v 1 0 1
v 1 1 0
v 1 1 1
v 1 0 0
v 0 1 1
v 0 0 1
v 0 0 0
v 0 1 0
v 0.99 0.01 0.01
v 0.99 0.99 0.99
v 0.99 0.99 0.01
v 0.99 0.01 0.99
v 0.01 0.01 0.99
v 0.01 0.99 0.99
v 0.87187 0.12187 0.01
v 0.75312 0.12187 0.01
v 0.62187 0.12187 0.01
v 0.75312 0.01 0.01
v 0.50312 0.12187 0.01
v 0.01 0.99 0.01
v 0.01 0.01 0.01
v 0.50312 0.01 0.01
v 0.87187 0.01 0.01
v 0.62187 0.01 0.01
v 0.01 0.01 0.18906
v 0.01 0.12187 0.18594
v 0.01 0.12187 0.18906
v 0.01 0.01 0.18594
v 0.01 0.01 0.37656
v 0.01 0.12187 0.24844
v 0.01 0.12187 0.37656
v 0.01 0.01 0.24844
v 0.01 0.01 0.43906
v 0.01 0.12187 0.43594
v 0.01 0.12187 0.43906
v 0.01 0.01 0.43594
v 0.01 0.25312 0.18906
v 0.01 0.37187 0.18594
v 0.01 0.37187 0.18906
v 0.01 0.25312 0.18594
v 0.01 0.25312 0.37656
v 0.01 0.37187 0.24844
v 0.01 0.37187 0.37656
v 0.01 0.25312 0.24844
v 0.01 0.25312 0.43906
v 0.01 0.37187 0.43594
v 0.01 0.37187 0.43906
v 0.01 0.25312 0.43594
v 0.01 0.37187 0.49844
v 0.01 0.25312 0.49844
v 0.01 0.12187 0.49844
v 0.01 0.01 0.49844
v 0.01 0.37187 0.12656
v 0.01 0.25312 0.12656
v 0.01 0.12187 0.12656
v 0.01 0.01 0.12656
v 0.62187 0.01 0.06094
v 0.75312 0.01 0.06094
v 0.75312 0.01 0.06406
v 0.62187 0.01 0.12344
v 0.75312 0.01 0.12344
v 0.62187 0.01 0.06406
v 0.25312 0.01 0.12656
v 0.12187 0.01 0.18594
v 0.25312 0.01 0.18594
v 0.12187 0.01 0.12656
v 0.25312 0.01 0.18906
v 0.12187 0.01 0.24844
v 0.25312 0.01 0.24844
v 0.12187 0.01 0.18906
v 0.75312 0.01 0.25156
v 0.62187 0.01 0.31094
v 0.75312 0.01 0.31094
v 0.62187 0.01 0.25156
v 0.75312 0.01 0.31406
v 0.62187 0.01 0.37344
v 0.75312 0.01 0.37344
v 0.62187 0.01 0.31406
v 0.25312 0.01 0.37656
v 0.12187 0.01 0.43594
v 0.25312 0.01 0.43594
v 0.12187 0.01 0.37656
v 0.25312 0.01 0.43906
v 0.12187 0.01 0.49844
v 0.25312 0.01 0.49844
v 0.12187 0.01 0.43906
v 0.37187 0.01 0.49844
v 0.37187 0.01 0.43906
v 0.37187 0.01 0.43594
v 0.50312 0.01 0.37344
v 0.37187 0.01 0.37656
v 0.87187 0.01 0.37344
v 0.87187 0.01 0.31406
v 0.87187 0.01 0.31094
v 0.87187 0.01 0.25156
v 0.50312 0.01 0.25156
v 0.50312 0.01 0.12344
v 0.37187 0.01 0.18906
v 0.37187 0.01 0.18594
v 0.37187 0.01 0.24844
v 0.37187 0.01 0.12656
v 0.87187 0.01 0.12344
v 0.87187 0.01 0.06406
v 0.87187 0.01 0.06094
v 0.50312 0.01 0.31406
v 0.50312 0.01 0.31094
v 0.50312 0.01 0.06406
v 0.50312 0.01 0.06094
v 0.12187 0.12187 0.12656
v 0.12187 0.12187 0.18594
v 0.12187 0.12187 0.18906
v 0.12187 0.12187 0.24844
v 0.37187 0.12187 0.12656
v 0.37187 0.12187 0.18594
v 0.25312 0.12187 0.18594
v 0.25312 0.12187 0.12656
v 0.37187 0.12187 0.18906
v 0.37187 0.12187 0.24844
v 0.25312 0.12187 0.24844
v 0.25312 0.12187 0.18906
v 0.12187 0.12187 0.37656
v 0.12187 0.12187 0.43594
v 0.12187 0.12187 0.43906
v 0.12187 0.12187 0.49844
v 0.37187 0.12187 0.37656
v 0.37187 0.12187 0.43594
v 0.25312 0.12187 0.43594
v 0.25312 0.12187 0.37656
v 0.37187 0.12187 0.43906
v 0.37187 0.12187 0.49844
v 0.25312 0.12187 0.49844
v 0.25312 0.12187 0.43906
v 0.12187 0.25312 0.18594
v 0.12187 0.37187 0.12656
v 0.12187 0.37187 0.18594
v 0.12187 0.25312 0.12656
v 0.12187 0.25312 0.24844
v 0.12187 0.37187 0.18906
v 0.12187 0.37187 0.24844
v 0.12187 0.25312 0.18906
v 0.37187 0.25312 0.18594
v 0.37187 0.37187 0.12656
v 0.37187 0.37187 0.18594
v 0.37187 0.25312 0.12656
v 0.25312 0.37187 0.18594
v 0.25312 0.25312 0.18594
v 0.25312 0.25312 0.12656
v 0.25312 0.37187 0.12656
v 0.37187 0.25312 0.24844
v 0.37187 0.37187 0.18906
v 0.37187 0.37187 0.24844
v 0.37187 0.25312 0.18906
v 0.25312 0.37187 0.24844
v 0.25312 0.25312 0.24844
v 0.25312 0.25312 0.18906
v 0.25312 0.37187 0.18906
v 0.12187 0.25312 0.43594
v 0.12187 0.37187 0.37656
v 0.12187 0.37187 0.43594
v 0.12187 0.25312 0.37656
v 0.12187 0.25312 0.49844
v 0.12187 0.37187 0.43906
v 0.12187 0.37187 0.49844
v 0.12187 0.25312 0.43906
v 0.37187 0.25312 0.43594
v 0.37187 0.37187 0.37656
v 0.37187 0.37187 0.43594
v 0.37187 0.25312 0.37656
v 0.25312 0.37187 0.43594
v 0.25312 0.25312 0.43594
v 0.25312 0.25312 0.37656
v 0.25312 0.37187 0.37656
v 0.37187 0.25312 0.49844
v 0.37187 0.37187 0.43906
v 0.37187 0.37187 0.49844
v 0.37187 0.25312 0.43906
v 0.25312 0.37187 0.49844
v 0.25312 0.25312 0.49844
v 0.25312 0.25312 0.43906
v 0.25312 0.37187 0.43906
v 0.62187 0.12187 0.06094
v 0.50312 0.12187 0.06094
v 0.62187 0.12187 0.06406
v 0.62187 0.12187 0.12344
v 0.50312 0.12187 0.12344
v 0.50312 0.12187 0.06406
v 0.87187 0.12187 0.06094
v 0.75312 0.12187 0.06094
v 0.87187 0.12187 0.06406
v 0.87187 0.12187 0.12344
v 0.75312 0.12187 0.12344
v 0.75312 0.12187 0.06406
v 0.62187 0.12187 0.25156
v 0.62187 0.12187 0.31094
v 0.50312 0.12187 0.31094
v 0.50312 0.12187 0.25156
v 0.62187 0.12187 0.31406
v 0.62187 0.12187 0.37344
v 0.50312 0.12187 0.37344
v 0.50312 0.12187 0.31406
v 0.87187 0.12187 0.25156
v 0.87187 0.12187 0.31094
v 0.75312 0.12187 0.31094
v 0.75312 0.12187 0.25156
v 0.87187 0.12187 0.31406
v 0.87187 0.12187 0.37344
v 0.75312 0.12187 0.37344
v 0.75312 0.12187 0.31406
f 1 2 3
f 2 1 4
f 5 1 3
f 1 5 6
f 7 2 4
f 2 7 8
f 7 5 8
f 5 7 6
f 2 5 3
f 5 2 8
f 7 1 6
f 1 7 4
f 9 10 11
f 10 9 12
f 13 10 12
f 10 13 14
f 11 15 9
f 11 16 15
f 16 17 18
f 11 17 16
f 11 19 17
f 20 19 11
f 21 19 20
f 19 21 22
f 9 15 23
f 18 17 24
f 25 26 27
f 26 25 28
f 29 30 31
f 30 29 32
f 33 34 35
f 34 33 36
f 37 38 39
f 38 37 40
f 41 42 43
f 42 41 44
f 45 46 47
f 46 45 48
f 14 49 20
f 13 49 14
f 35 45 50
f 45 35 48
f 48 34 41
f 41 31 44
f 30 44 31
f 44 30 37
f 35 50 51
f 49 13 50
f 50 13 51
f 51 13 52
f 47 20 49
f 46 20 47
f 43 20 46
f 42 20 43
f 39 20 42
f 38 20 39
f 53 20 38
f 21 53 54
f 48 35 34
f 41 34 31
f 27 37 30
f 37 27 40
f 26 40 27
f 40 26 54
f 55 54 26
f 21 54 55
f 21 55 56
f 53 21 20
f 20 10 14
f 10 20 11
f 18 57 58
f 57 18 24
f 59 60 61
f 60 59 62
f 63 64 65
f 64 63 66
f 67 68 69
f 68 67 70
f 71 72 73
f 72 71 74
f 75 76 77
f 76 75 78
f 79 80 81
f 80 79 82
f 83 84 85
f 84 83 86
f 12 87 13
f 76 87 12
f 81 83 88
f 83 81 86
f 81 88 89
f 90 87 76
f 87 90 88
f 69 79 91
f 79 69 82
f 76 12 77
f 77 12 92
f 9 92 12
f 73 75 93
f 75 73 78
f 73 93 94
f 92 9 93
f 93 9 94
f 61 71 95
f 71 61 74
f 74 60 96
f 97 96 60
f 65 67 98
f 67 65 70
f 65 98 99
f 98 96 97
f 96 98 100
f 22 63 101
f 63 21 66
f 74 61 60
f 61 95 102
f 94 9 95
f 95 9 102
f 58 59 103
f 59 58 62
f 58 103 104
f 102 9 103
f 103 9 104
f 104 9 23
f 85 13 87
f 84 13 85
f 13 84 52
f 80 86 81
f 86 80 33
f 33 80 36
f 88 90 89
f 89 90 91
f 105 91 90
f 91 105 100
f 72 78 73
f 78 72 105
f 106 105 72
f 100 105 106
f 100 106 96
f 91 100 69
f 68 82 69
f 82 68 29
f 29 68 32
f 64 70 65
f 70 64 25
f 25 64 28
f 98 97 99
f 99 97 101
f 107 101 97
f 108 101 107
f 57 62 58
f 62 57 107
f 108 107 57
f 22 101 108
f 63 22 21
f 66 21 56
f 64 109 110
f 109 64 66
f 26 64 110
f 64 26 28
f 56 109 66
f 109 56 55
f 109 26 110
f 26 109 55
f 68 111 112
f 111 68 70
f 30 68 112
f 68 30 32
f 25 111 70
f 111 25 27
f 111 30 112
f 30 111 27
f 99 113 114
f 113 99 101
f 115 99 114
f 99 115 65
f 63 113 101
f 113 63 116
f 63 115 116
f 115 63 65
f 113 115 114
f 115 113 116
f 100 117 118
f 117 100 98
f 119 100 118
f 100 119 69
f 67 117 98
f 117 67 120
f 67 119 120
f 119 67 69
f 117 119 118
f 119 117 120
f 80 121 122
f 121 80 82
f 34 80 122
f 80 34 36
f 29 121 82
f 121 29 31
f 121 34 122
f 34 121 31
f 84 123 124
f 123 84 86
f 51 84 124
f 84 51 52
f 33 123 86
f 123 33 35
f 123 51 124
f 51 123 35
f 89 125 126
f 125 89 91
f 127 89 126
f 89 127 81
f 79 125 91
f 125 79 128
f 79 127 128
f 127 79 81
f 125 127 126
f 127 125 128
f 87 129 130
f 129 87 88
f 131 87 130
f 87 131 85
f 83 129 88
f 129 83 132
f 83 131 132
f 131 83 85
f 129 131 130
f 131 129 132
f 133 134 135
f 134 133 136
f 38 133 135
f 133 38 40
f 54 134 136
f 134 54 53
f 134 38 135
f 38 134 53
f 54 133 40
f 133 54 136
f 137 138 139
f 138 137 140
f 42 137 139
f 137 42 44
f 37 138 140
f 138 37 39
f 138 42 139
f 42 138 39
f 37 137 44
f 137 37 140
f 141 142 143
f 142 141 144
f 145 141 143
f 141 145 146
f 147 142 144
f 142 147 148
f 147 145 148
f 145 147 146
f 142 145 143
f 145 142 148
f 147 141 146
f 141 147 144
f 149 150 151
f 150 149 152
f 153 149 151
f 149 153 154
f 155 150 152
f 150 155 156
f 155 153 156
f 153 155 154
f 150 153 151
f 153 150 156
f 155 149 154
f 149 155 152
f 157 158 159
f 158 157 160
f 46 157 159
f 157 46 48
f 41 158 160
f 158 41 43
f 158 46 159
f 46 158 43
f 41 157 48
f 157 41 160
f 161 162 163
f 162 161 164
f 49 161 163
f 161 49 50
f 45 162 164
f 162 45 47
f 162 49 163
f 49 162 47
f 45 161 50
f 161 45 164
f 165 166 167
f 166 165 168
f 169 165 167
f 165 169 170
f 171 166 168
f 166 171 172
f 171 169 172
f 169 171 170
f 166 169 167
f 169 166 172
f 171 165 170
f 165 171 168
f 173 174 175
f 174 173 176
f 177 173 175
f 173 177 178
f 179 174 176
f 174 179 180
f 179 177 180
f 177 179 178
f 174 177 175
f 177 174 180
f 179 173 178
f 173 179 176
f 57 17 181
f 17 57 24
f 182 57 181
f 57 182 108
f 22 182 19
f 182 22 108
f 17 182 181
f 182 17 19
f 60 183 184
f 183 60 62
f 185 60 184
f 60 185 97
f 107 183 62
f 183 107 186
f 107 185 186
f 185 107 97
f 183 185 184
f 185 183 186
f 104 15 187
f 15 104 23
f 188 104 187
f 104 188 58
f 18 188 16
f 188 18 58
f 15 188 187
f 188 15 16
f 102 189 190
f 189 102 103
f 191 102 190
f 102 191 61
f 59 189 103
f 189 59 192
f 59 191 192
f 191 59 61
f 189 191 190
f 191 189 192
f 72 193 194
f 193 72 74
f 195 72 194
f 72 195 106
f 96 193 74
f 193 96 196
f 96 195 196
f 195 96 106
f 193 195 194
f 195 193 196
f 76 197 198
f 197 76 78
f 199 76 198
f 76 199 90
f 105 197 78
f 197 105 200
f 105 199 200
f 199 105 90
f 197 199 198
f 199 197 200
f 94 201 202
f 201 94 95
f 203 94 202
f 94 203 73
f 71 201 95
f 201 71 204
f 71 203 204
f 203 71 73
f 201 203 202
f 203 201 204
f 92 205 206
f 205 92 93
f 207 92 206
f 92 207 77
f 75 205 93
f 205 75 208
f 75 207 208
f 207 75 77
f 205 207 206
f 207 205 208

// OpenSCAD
translate([0.0625, 0.0625, 0.15625]) color([0.18894415855786206, 0.8084526775944827, 0.5240727557148024]) cube([0.11875, 0.11875, 0.059375], center=true);
translate([0.0625, 0.0625, 0.21875]) color([0.33009817895383553, 0.6358447971330878, 0.274476683198677]) cube([0.11875, 0.11875, 0.059375], center=true);
translate([0.3125, 0.0625, 0.15625]) color([0.7036882936284021, 0.9548751840233447, 0.5755708060880032]) cube([0.11875, 0.11875, 0.059375], center=true);
translate([0.3125, 0.0625, 0.21875]) color([0.41204698353559877, 0.5796286851254486, 0.28286322414623355]) cube([0.11875, 0.11875, 0.059375], center=true);
translate([0.0625, 0.0625, 0.40625]) color([0.83488960487533, 0.7968053445508819, 0.9111606805714901]) cube([0.11875, 0.11875, 0.059375], center=true);
translate([0.0625, 0.0625, 0.46875]) color([0.24277728252059738, 0.2698201644401115, 0.25372921938475945]) cube([0.11875, 0.11875, 0.059375], center=true);
translate([0.3125, 0.0625, 0.40625]) color([0.3248429479181304, 0.33731838939050207, 0.46012102584031667]) cube([0.11875, 0.11875, 0.059375], center=true);
translate([0.3125, 0.0625, 0.46875]) color([0.4972140619467261, 0.4460540182101679, 0.582257111213957]) cube([0.11875, 0.11875, 0.059375], center=true);
translate([0.0625, 0.3125, 0.15625]) color([0.38189019333285656, 0.9329183366158048, 0.74346568951076]) cube([0.11875, 0.11875, 0.059375], center=true);
translate([0.0625, 0.3125, 0.21875]) color([0.10367473231816282, 0.6513301228797536, 0.21210212161149367]) cube([0.11875, 0.11875, 0.059375], center=true);
translate([0.3125, 0.3125, 0.15625]) color([0.4071949612628585, 0.6715659813617996, 0.17871221391606673]) cube([0.11875, 0.11875, 0.059375], center=true);
translate([0.3125, 0.3125, 0.21875]) color([0.17752412341011714, 0.6556599876579107, 0.7040052939421468]) cube([0.11875, 0.11875, 0.059375], center=true);
translate([0.0625, 0.3125, 0.40625]) color([0.9236087761692187, 0.21340315940002685, 0.5989435772305987]) cube([0.11875, 0.11875, 0.059375], center=true);
translate([0.0625, 0.3125, 0.46875]) color([0.8450733127471588, 0.6003349610680997, 0.5954496070156984]) cube([0.11875, 0.11875, 0.059375], center=true);
translate([0.3125, 0.3125, 0.40625]) color([0.920709623693076, 0.4233833186292486, 0.4754938941291812]) cube([0.11875, 0.11875, 0.059375], center=true);
translate([0.3125, 0.3125, 0.46875]) color([0.872421437716006, 0.9767589381362137, 0.9086126193256788]) cube([0.11875, 0.11875, 0.059375], center=true);
translate([0.5625, 0.0625, 0.03125]) color([0.7884233486788577, 0.8262914624918754, 0.6636415038118221]) cube([0.11875, 0.11875, 0.059375], center=true);
translate([0.5625, 0.0625, 0.09375]) color([0.36270118963089737, 0.5138414630226216, 0.14357255994509865]) cube([0.11875, 0.11875, 0.059375], center=true);
translate([0.8125, 0.0625, 0.03125]) color([0.466624584989368, 0.29734697142143796, 0.9844700368526675]) cube([0.11875, 0.11875, 0.059375], center=true);
translate([0.8125, 0.0625, 0.09375]) color([0.6752891164641136, 0.29017518075598103, 0.4342964607752302]) cube([0.11875, 0.11875, 0.059375], center=true);
translate([0.5625, 0.0625, 0.28125]) color([0.773003957160343, 0.565247166210502, 0.9239404304157245]) cube([0.11875, 0.11875, 0.059375], center=true);
translate([0.5625, 0.0625, 0.34375]) color([0.16032310979410902, 0.8355206000915061, 0.5688487402091276]) cube([0.11875, 0.11875, 0.059375], center=true);
translate([0.8125, 0.0625, 0.28125]) color([0.20030491603062106, 0.9799112189115262, 0.7788088383598656]) cube([0.11875, 0.11875, 0.059375], center=true);
translate([0.8125, 0.0625, 0.34375]) color([0.3331229107175697, 0.956723341350572, 0.8892995412421422]) cube([0.11875, 0.11875, 0.059375], center=true);
color([0.3,0.3,0.3,0.3]) difference() { cube([1,1,1]); translate([0.01,0.01,0.01]) cube([0.98,0.98,0.98]); }
